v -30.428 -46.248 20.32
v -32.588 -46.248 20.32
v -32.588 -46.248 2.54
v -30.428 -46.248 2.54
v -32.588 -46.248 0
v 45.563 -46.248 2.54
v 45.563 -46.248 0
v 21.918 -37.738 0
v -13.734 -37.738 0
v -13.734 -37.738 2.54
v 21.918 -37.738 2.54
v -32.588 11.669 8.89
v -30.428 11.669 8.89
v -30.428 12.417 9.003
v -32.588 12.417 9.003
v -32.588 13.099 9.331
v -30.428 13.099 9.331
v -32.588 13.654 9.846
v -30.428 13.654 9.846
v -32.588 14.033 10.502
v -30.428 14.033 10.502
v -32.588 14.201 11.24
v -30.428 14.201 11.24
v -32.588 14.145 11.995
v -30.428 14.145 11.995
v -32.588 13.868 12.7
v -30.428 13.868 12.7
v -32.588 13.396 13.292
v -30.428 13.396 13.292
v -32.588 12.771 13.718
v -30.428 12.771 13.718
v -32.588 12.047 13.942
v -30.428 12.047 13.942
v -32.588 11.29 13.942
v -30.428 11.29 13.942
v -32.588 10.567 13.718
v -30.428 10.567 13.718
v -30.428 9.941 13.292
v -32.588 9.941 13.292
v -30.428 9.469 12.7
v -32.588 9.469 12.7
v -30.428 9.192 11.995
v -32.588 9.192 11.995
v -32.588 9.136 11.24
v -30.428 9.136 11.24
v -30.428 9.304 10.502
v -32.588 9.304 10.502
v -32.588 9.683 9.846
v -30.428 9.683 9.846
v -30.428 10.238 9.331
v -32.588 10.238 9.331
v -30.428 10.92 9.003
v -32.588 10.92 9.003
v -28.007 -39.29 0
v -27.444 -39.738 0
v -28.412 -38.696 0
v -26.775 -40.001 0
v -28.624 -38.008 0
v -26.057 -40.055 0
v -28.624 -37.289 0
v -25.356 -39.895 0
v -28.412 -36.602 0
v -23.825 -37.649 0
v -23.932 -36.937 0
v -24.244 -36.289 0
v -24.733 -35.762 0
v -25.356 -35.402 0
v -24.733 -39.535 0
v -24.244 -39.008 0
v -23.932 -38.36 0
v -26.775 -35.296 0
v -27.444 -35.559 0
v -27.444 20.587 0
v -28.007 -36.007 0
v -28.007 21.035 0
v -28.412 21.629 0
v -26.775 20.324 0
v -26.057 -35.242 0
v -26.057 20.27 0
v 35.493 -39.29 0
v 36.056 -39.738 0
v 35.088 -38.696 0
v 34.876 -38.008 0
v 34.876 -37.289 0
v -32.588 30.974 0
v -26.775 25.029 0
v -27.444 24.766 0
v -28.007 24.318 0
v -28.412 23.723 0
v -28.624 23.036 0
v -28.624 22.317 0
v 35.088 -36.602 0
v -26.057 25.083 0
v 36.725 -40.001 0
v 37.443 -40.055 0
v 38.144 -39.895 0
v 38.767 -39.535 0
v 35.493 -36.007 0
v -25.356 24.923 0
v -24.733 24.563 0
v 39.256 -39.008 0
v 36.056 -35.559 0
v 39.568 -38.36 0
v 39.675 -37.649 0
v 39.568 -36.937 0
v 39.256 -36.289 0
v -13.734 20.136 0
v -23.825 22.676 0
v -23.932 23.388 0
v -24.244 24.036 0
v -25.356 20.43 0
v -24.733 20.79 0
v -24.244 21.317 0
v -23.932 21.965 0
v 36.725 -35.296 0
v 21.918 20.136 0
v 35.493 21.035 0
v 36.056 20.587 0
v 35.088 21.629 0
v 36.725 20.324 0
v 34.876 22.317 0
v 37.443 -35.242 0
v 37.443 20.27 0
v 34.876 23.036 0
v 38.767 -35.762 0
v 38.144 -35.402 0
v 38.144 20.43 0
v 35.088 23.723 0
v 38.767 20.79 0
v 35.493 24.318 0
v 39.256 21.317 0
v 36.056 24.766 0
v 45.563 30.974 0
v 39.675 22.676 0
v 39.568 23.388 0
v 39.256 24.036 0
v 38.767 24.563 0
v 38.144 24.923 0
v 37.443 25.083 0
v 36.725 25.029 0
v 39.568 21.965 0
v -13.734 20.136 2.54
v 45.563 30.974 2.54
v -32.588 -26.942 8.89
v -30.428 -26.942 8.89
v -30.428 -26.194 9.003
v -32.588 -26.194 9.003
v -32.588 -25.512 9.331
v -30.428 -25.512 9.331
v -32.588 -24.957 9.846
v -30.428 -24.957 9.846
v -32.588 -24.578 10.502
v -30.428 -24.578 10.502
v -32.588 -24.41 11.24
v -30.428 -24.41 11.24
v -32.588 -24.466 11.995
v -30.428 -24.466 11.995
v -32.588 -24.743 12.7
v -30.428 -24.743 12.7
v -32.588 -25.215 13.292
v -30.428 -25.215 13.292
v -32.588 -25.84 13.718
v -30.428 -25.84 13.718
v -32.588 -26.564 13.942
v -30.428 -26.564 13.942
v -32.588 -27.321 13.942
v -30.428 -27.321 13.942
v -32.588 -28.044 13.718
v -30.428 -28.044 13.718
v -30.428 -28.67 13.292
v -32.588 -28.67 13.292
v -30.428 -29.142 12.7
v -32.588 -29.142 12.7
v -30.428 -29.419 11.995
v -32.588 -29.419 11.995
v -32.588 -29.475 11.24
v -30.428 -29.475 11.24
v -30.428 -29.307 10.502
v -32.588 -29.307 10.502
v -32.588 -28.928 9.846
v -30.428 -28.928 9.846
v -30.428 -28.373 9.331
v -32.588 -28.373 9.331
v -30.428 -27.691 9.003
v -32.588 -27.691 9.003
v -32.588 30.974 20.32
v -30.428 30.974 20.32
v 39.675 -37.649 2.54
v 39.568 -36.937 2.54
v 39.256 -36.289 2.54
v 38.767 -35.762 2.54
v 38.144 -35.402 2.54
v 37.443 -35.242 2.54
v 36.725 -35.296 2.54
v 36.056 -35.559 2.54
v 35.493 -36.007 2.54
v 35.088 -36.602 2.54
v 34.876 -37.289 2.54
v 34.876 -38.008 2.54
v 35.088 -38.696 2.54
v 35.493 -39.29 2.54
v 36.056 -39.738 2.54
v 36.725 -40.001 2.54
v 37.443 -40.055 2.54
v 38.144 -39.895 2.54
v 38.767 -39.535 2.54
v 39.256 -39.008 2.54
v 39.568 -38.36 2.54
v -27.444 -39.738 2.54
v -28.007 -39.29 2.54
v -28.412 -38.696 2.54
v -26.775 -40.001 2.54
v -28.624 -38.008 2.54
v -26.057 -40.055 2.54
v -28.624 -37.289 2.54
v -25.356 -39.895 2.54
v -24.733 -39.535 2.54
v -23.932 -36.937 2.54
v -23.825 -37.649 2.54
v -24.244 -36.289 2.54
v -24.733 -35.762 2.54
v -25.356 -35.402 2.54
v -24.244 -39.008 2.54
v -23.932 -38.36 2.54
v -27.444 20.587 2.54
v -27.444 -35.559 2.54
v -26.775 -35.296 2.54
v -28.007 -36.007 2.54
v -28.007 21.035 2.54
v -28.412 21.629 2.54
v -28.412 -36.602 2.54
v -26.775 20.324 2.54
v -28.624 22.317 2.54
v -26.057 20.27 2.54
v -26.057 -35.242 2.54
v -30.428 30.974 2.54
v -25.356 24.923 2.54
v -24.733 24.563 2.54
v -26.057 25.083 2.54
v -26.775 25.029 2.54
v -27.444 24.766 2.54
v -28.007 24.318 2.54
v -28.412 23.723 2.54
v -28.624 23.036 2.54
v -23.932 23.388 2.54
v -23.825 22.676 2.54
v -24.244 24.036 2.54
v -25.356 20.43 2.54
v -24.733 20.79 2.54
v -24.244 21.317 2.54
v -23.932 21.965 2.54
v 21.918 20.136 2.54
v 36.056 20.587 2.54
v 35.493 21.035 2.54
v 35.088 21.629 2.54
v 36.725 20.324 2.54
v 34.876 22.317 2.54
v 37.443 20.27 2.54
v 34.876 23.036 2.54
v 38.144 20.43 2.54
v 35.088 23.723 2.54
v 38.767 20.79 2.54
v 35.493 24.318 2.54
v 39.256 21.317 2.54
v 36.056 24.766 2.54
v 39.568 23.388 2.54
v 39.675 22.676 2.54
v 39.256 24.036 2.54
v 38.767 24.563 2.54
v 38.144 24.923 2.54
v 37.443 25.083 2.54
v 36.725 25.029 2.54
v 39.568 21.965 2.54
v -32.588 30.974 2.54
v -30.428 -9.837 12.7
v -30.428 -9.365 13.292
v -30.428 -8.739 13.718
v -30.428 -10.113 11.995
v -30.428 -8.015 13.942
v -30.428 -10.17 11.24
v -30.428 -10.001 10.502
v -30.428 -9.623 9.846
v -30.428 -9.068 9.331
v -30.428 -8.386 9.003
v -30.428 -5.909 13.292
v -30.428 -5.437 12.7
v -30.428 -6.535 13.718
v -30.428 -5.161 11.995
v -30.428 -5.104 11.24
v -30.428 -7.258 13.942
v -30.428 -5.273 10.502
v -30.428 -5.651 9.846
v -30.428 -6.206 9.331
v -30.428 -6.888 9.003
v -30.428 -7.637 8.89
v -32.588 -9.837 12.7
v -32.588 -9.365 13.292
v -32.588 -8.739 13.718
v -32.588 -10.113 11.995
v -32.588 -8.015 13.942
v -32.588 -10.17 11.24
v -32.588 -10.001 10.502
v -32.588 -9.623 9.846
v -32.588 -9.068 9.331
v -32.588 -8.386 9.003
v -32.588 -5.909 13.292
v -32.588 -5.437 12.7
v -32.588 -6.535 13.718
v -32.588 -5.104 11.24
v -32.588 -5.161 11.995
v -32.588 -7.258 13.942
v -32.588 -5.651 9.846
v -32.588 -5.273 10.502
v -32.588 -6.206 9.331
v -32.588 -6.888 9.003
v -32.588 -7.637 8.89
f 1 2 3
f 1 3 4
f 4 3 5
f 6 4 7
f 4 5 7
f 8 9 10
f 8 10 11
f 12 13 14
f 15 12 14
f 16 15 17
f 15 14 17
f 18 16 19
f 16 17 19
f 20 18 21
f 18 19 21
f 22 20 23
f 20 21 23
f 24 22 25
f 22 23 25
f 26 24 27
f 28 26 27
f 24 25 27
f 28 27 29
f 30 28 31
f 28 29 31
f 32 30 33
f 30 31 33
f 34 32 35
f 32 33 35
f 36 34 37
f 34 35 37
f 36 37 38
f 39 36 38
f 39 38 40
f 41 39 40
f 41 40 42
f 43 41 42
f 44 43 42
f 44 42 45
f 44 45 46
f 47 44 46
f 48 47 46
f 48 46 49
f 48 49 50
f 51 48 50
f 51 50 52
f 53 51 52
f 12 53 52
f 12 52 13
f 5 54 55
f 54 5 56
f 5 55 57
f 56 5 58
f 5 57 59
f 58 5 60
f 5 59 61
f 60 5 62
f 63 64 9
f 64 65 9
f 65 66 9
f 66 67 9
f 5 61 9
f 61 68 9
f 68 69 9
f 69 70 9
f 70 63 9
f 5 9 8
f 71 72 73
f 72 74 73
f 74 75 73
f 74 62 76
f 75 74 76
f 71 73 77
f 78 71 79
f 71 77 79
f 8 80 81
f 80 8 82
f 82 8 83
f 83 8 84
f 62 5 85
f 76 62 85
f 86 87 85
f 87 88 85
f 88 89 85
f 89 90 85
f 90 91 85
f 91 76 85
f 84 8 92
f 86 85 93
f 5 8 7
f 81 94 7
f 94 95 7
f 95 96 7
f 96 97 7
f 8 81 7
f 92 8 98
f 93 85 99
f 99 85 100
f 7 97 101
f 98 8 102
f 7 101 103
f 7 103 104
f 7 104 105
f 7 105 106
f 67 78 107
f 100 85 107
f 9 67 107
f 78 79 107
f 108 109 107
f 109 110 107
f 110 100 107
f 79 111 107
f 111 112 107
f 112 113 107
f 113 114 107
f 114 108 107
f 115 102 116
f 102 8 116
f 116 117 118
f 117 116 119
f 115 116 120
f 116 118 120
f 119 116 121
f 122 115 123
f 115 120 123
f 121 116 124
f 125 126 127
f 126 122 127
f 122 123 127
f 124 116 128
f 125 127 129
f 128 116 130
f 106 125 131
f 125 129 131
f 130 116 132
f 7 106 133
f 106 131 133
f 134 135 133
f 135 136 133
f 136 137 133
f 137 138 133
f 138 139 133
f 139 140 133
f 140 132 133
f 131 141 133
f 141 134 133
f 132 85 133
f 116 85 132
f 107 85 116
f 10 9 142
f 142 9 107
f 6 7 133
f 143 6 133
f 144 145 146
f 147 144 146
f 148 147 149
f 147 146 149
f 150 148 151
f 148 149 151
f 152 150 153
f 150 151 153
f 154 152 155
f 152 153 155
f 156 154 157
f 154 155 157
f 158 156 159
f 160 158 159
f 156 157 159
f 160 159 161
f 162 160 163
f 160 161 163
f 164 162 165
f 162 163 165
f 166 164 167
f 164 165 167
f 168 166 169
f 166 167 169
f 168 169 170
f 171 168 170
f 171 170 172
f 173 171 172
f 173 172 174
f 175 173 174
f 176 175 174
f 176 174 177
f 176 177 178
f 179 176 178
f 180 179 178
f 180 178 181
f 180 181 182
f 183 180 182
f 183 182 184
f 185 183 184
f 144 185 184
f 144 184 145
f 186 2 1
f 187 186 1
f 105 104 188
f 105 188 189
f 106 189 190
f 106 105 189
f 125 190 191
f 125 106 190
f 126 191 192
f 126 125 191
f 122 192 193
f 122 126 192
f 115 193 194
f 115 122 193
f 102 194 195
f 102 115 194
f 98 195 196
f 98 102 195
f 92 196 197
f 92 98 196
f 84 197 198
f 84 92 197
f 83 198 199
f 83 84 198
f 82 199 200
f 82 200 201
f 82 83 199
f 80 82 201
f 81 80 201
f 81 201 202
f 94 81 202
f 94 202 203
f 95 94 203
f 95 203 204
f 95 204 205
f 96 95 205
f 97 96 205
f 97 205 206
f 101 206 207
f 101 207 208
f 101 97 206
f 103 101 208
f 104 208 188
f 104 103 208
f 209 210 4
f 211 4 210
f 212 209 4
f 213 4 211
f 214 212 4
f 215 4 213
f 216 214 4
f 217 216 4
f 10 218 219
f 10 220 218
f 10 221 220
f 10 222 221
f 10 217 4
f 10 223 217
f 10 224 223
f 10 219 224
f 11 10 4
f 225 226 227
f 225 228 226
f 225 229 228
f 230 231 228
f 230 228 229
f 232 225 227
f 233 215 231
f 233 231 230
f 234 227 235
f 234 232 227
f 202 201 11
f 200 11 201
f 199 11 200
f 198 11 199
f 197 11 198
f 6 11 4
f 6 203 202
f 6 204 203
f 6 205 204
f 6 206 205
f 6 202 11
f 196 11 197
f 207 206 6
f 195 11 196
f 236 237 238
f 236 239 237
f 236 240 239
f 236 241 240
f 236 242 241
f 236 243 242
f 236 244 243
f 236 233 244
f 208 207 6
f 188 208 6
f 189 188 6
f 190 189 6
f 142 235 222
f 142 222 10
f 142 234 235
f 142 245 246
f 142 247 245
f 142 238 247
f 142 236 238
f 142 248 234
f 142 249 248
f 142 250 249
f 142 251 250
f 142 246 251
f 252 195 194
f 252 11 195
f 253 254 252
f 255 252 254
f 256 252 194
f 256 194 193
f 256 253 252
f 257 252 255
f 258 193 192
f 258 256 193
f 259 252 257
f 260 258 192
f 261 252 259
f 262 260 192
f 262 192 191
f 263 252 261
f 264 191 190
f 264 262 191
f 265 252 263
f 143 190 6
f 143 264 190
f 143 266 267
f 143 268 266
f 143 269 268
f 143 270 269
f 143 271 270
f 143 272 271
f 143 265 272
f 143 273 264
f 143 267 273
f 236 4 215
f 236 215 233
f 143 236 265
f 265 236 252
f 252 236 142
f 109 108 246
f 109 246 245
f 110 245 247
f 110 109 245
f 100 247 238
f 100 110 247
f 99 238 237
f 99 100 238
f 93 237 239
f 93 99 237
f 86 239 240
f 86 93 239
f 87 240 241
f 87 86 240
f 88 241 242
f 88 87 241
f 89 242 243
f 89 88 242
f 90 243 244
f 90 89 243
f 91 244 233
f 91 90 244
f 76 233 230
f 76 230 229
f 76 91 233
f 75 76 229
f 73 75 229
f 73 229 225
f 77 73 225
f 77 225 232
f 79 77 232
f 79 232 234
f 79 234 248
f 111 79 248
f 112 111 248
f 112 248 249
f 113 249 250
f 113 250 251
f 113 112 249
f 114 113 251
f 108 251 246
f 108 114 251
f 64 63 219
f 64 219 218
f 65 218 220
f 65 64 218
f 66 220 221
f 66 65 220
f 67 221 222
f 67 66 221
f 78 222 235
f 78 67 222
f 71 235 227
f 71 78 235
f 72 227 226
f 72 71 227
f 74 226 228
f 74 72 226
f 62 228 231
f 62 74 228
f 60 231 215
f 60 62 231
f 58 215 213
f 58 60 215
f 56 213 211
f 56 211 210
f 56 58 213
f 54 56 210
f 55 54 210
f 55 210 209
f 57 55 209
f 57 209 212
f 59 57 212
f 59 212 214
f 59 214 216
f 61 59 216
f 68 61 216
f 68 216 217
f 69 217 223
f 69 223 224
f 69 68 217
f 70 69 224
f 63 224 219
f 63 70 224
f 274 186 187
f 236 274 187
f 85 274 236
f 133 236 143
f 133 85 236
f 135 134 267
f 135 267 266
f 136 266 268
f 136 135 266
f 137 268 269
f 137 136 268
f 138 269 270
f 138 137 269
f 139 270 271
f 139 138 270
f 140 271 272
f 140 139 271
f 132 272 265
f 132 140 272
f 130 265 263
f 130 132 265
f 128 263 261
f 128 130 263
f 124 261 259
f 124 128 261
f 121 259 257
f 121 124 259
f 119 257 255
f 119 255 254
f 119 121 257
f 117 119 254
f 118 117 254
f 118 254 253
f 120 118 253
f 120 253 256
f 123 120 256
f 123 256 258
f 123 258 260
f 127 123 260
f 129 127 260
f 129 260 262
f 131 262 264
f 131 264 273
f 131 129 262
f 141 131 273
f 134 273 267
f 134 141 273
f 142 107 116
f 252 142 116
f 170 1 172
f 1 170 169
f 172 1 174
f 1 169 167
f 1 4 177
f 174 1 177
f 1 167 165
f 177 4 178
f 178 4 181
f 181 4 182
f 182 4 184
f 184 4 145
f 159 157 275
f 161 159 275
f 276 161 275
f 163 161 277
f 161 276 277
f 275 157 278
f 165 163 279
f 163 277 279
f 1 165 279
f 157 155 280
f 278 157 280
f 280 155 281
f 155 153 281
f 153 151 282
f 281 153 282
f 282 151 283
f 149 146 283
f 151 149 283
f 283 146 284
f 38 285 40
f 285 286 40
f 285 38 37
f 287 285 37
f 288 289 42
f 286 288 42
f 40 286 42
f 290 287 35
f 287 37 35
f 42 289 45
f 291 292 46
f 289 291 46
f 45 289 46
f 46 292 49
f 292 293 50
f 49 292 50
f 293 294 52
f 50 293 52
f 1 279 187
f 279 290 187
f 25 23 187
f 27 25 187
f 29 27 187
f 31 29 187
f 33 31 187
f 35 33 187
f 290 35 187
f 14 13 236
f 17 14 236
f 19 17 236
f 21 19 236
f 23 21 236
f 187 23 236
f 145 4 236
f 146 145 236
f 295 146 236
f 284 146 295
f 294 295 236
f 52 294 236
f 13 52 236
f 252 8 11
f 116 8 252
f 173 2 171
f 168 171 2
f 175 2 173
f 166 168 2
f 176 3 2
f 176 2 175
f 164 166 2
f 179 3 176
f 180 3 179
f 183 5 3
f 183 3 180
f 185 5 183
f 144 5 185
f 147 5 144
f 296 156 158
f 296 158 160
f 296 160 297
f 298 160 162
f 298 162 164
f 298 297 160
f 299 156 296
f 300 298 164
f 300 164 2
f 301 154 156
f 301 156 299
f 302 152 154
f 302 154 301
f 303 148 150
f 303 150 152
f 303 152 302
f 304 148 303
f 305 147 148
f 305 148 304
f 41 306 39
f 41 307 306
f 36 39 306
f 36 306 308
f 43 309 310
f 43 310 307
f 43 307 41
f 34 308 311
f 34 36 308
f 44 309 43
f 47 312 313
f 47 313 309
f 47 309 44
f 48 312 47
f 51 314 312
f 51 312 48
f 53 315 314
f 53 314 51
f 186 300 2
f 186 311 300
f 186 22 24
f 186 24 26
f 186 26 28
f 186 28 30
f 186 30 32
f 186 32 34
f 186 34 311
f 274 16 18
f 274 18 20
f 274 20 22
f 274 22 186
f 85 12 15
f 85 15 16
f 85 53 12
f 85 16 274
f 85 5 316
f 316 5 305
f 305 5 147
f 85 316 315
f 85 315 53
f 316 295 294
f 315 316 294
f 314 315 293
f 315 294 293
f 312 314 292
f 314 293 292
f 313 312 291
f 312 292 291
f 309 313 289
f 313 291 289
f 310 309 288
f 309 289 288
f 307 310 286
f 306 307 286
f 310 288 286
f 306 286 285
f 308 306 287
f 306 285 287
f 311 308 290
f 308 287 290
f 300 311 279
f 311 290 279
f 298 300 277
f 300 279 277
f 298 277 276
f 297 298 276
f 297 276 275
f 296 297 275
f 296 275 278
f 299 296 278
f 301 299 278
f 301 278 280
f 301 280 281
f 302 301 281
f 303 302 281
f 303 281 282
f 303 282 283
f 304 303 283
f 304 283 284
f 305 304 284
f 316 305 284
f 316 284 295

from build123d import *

# Parameters (mm, degrees)
SKETCH2_W           = 78.150454931
SKETCH2_H           = 77.221988429
SKETCH2_R           = 2.413
SKETCH2_W_2         = 35.652738644
SKETCH2_H_2         = 57.874285637
BOSS_EXTRUDE1_DEPTH = 2.54
SKETCH3_W           = 2.159598277
SKETCH3_H           = 77.221988429
BOSS_EXTRUDE2_DEPTH = 17.78
SKETCH5_R           = 2.54
CUT_EXTRUDE2_DEPTH  = 17.78


with BuildPart() as part:
    # Sketch2 → Boss-Extrude1 (new body)
    with BuildSketch(Plane.XY):
        with Locations((6.487490533, -7.63692736)):
            Rectangle(SKETCH2_W, SKETCH2_H)
        with Locations((-26.23773696, 22.67645588)):
            Circle(SKETCH2_R, mode=Mode.SUBTRACT)
        with Locations((37.26226304, 22.67645588)):
            Circle(SKETCH2_R, mode=Mode.SUBTRACT)
        with Locations((37.26226304, -37.64854412)):
            Circle(SKETCH2_R, mode=Mode.SUBTRACT)
        with Locations((-26.23773696, -37.64854412)):
            Circle(SKETCH2_R, mode=Mode.SUBTRACT)
        with Locations((4.092128919, -8.801242849)):
            Rectangle(SKETCH2_W_2, SKETCH2_H_2, mode=Mode.SUBTRACT)
    extrude(amount=BOSS_EXTRUDE1_DEPTH)

    # Sketch3 → Boss-Extrude2 (add)
    with BuildSketch(Plane.XY.offset(2.54)):
        with Locations((-31.507937795, -7.63692736)):
            Rectangle(SKETCH3_W, SKETCH3_H)
    extrude(amount=BOSS_EXTRUDE2_DEPTH)

    # Sketch5 → Cut-Extrude2 (cut)
    with BuildSketch(Plane(origin=(-30.428138656, 0, 0), x_dir=(0, 0, -1), z_dir=(1, 0, 0))):
        with Locations((-11.43, -7.636927359)):
            Circle(SKETCH5_R)
        with Locations((-11.43, 11.668569748)):
            Circle(SKETCH5_R)
        with Locations((-11.43, -26.942424466)):
            Circle(SKETCH5_R)
    extrude(amount=-CUT_EXTRUDE2_DEPTH, mode=Mode.SUBTRACT)


solid = part.part
